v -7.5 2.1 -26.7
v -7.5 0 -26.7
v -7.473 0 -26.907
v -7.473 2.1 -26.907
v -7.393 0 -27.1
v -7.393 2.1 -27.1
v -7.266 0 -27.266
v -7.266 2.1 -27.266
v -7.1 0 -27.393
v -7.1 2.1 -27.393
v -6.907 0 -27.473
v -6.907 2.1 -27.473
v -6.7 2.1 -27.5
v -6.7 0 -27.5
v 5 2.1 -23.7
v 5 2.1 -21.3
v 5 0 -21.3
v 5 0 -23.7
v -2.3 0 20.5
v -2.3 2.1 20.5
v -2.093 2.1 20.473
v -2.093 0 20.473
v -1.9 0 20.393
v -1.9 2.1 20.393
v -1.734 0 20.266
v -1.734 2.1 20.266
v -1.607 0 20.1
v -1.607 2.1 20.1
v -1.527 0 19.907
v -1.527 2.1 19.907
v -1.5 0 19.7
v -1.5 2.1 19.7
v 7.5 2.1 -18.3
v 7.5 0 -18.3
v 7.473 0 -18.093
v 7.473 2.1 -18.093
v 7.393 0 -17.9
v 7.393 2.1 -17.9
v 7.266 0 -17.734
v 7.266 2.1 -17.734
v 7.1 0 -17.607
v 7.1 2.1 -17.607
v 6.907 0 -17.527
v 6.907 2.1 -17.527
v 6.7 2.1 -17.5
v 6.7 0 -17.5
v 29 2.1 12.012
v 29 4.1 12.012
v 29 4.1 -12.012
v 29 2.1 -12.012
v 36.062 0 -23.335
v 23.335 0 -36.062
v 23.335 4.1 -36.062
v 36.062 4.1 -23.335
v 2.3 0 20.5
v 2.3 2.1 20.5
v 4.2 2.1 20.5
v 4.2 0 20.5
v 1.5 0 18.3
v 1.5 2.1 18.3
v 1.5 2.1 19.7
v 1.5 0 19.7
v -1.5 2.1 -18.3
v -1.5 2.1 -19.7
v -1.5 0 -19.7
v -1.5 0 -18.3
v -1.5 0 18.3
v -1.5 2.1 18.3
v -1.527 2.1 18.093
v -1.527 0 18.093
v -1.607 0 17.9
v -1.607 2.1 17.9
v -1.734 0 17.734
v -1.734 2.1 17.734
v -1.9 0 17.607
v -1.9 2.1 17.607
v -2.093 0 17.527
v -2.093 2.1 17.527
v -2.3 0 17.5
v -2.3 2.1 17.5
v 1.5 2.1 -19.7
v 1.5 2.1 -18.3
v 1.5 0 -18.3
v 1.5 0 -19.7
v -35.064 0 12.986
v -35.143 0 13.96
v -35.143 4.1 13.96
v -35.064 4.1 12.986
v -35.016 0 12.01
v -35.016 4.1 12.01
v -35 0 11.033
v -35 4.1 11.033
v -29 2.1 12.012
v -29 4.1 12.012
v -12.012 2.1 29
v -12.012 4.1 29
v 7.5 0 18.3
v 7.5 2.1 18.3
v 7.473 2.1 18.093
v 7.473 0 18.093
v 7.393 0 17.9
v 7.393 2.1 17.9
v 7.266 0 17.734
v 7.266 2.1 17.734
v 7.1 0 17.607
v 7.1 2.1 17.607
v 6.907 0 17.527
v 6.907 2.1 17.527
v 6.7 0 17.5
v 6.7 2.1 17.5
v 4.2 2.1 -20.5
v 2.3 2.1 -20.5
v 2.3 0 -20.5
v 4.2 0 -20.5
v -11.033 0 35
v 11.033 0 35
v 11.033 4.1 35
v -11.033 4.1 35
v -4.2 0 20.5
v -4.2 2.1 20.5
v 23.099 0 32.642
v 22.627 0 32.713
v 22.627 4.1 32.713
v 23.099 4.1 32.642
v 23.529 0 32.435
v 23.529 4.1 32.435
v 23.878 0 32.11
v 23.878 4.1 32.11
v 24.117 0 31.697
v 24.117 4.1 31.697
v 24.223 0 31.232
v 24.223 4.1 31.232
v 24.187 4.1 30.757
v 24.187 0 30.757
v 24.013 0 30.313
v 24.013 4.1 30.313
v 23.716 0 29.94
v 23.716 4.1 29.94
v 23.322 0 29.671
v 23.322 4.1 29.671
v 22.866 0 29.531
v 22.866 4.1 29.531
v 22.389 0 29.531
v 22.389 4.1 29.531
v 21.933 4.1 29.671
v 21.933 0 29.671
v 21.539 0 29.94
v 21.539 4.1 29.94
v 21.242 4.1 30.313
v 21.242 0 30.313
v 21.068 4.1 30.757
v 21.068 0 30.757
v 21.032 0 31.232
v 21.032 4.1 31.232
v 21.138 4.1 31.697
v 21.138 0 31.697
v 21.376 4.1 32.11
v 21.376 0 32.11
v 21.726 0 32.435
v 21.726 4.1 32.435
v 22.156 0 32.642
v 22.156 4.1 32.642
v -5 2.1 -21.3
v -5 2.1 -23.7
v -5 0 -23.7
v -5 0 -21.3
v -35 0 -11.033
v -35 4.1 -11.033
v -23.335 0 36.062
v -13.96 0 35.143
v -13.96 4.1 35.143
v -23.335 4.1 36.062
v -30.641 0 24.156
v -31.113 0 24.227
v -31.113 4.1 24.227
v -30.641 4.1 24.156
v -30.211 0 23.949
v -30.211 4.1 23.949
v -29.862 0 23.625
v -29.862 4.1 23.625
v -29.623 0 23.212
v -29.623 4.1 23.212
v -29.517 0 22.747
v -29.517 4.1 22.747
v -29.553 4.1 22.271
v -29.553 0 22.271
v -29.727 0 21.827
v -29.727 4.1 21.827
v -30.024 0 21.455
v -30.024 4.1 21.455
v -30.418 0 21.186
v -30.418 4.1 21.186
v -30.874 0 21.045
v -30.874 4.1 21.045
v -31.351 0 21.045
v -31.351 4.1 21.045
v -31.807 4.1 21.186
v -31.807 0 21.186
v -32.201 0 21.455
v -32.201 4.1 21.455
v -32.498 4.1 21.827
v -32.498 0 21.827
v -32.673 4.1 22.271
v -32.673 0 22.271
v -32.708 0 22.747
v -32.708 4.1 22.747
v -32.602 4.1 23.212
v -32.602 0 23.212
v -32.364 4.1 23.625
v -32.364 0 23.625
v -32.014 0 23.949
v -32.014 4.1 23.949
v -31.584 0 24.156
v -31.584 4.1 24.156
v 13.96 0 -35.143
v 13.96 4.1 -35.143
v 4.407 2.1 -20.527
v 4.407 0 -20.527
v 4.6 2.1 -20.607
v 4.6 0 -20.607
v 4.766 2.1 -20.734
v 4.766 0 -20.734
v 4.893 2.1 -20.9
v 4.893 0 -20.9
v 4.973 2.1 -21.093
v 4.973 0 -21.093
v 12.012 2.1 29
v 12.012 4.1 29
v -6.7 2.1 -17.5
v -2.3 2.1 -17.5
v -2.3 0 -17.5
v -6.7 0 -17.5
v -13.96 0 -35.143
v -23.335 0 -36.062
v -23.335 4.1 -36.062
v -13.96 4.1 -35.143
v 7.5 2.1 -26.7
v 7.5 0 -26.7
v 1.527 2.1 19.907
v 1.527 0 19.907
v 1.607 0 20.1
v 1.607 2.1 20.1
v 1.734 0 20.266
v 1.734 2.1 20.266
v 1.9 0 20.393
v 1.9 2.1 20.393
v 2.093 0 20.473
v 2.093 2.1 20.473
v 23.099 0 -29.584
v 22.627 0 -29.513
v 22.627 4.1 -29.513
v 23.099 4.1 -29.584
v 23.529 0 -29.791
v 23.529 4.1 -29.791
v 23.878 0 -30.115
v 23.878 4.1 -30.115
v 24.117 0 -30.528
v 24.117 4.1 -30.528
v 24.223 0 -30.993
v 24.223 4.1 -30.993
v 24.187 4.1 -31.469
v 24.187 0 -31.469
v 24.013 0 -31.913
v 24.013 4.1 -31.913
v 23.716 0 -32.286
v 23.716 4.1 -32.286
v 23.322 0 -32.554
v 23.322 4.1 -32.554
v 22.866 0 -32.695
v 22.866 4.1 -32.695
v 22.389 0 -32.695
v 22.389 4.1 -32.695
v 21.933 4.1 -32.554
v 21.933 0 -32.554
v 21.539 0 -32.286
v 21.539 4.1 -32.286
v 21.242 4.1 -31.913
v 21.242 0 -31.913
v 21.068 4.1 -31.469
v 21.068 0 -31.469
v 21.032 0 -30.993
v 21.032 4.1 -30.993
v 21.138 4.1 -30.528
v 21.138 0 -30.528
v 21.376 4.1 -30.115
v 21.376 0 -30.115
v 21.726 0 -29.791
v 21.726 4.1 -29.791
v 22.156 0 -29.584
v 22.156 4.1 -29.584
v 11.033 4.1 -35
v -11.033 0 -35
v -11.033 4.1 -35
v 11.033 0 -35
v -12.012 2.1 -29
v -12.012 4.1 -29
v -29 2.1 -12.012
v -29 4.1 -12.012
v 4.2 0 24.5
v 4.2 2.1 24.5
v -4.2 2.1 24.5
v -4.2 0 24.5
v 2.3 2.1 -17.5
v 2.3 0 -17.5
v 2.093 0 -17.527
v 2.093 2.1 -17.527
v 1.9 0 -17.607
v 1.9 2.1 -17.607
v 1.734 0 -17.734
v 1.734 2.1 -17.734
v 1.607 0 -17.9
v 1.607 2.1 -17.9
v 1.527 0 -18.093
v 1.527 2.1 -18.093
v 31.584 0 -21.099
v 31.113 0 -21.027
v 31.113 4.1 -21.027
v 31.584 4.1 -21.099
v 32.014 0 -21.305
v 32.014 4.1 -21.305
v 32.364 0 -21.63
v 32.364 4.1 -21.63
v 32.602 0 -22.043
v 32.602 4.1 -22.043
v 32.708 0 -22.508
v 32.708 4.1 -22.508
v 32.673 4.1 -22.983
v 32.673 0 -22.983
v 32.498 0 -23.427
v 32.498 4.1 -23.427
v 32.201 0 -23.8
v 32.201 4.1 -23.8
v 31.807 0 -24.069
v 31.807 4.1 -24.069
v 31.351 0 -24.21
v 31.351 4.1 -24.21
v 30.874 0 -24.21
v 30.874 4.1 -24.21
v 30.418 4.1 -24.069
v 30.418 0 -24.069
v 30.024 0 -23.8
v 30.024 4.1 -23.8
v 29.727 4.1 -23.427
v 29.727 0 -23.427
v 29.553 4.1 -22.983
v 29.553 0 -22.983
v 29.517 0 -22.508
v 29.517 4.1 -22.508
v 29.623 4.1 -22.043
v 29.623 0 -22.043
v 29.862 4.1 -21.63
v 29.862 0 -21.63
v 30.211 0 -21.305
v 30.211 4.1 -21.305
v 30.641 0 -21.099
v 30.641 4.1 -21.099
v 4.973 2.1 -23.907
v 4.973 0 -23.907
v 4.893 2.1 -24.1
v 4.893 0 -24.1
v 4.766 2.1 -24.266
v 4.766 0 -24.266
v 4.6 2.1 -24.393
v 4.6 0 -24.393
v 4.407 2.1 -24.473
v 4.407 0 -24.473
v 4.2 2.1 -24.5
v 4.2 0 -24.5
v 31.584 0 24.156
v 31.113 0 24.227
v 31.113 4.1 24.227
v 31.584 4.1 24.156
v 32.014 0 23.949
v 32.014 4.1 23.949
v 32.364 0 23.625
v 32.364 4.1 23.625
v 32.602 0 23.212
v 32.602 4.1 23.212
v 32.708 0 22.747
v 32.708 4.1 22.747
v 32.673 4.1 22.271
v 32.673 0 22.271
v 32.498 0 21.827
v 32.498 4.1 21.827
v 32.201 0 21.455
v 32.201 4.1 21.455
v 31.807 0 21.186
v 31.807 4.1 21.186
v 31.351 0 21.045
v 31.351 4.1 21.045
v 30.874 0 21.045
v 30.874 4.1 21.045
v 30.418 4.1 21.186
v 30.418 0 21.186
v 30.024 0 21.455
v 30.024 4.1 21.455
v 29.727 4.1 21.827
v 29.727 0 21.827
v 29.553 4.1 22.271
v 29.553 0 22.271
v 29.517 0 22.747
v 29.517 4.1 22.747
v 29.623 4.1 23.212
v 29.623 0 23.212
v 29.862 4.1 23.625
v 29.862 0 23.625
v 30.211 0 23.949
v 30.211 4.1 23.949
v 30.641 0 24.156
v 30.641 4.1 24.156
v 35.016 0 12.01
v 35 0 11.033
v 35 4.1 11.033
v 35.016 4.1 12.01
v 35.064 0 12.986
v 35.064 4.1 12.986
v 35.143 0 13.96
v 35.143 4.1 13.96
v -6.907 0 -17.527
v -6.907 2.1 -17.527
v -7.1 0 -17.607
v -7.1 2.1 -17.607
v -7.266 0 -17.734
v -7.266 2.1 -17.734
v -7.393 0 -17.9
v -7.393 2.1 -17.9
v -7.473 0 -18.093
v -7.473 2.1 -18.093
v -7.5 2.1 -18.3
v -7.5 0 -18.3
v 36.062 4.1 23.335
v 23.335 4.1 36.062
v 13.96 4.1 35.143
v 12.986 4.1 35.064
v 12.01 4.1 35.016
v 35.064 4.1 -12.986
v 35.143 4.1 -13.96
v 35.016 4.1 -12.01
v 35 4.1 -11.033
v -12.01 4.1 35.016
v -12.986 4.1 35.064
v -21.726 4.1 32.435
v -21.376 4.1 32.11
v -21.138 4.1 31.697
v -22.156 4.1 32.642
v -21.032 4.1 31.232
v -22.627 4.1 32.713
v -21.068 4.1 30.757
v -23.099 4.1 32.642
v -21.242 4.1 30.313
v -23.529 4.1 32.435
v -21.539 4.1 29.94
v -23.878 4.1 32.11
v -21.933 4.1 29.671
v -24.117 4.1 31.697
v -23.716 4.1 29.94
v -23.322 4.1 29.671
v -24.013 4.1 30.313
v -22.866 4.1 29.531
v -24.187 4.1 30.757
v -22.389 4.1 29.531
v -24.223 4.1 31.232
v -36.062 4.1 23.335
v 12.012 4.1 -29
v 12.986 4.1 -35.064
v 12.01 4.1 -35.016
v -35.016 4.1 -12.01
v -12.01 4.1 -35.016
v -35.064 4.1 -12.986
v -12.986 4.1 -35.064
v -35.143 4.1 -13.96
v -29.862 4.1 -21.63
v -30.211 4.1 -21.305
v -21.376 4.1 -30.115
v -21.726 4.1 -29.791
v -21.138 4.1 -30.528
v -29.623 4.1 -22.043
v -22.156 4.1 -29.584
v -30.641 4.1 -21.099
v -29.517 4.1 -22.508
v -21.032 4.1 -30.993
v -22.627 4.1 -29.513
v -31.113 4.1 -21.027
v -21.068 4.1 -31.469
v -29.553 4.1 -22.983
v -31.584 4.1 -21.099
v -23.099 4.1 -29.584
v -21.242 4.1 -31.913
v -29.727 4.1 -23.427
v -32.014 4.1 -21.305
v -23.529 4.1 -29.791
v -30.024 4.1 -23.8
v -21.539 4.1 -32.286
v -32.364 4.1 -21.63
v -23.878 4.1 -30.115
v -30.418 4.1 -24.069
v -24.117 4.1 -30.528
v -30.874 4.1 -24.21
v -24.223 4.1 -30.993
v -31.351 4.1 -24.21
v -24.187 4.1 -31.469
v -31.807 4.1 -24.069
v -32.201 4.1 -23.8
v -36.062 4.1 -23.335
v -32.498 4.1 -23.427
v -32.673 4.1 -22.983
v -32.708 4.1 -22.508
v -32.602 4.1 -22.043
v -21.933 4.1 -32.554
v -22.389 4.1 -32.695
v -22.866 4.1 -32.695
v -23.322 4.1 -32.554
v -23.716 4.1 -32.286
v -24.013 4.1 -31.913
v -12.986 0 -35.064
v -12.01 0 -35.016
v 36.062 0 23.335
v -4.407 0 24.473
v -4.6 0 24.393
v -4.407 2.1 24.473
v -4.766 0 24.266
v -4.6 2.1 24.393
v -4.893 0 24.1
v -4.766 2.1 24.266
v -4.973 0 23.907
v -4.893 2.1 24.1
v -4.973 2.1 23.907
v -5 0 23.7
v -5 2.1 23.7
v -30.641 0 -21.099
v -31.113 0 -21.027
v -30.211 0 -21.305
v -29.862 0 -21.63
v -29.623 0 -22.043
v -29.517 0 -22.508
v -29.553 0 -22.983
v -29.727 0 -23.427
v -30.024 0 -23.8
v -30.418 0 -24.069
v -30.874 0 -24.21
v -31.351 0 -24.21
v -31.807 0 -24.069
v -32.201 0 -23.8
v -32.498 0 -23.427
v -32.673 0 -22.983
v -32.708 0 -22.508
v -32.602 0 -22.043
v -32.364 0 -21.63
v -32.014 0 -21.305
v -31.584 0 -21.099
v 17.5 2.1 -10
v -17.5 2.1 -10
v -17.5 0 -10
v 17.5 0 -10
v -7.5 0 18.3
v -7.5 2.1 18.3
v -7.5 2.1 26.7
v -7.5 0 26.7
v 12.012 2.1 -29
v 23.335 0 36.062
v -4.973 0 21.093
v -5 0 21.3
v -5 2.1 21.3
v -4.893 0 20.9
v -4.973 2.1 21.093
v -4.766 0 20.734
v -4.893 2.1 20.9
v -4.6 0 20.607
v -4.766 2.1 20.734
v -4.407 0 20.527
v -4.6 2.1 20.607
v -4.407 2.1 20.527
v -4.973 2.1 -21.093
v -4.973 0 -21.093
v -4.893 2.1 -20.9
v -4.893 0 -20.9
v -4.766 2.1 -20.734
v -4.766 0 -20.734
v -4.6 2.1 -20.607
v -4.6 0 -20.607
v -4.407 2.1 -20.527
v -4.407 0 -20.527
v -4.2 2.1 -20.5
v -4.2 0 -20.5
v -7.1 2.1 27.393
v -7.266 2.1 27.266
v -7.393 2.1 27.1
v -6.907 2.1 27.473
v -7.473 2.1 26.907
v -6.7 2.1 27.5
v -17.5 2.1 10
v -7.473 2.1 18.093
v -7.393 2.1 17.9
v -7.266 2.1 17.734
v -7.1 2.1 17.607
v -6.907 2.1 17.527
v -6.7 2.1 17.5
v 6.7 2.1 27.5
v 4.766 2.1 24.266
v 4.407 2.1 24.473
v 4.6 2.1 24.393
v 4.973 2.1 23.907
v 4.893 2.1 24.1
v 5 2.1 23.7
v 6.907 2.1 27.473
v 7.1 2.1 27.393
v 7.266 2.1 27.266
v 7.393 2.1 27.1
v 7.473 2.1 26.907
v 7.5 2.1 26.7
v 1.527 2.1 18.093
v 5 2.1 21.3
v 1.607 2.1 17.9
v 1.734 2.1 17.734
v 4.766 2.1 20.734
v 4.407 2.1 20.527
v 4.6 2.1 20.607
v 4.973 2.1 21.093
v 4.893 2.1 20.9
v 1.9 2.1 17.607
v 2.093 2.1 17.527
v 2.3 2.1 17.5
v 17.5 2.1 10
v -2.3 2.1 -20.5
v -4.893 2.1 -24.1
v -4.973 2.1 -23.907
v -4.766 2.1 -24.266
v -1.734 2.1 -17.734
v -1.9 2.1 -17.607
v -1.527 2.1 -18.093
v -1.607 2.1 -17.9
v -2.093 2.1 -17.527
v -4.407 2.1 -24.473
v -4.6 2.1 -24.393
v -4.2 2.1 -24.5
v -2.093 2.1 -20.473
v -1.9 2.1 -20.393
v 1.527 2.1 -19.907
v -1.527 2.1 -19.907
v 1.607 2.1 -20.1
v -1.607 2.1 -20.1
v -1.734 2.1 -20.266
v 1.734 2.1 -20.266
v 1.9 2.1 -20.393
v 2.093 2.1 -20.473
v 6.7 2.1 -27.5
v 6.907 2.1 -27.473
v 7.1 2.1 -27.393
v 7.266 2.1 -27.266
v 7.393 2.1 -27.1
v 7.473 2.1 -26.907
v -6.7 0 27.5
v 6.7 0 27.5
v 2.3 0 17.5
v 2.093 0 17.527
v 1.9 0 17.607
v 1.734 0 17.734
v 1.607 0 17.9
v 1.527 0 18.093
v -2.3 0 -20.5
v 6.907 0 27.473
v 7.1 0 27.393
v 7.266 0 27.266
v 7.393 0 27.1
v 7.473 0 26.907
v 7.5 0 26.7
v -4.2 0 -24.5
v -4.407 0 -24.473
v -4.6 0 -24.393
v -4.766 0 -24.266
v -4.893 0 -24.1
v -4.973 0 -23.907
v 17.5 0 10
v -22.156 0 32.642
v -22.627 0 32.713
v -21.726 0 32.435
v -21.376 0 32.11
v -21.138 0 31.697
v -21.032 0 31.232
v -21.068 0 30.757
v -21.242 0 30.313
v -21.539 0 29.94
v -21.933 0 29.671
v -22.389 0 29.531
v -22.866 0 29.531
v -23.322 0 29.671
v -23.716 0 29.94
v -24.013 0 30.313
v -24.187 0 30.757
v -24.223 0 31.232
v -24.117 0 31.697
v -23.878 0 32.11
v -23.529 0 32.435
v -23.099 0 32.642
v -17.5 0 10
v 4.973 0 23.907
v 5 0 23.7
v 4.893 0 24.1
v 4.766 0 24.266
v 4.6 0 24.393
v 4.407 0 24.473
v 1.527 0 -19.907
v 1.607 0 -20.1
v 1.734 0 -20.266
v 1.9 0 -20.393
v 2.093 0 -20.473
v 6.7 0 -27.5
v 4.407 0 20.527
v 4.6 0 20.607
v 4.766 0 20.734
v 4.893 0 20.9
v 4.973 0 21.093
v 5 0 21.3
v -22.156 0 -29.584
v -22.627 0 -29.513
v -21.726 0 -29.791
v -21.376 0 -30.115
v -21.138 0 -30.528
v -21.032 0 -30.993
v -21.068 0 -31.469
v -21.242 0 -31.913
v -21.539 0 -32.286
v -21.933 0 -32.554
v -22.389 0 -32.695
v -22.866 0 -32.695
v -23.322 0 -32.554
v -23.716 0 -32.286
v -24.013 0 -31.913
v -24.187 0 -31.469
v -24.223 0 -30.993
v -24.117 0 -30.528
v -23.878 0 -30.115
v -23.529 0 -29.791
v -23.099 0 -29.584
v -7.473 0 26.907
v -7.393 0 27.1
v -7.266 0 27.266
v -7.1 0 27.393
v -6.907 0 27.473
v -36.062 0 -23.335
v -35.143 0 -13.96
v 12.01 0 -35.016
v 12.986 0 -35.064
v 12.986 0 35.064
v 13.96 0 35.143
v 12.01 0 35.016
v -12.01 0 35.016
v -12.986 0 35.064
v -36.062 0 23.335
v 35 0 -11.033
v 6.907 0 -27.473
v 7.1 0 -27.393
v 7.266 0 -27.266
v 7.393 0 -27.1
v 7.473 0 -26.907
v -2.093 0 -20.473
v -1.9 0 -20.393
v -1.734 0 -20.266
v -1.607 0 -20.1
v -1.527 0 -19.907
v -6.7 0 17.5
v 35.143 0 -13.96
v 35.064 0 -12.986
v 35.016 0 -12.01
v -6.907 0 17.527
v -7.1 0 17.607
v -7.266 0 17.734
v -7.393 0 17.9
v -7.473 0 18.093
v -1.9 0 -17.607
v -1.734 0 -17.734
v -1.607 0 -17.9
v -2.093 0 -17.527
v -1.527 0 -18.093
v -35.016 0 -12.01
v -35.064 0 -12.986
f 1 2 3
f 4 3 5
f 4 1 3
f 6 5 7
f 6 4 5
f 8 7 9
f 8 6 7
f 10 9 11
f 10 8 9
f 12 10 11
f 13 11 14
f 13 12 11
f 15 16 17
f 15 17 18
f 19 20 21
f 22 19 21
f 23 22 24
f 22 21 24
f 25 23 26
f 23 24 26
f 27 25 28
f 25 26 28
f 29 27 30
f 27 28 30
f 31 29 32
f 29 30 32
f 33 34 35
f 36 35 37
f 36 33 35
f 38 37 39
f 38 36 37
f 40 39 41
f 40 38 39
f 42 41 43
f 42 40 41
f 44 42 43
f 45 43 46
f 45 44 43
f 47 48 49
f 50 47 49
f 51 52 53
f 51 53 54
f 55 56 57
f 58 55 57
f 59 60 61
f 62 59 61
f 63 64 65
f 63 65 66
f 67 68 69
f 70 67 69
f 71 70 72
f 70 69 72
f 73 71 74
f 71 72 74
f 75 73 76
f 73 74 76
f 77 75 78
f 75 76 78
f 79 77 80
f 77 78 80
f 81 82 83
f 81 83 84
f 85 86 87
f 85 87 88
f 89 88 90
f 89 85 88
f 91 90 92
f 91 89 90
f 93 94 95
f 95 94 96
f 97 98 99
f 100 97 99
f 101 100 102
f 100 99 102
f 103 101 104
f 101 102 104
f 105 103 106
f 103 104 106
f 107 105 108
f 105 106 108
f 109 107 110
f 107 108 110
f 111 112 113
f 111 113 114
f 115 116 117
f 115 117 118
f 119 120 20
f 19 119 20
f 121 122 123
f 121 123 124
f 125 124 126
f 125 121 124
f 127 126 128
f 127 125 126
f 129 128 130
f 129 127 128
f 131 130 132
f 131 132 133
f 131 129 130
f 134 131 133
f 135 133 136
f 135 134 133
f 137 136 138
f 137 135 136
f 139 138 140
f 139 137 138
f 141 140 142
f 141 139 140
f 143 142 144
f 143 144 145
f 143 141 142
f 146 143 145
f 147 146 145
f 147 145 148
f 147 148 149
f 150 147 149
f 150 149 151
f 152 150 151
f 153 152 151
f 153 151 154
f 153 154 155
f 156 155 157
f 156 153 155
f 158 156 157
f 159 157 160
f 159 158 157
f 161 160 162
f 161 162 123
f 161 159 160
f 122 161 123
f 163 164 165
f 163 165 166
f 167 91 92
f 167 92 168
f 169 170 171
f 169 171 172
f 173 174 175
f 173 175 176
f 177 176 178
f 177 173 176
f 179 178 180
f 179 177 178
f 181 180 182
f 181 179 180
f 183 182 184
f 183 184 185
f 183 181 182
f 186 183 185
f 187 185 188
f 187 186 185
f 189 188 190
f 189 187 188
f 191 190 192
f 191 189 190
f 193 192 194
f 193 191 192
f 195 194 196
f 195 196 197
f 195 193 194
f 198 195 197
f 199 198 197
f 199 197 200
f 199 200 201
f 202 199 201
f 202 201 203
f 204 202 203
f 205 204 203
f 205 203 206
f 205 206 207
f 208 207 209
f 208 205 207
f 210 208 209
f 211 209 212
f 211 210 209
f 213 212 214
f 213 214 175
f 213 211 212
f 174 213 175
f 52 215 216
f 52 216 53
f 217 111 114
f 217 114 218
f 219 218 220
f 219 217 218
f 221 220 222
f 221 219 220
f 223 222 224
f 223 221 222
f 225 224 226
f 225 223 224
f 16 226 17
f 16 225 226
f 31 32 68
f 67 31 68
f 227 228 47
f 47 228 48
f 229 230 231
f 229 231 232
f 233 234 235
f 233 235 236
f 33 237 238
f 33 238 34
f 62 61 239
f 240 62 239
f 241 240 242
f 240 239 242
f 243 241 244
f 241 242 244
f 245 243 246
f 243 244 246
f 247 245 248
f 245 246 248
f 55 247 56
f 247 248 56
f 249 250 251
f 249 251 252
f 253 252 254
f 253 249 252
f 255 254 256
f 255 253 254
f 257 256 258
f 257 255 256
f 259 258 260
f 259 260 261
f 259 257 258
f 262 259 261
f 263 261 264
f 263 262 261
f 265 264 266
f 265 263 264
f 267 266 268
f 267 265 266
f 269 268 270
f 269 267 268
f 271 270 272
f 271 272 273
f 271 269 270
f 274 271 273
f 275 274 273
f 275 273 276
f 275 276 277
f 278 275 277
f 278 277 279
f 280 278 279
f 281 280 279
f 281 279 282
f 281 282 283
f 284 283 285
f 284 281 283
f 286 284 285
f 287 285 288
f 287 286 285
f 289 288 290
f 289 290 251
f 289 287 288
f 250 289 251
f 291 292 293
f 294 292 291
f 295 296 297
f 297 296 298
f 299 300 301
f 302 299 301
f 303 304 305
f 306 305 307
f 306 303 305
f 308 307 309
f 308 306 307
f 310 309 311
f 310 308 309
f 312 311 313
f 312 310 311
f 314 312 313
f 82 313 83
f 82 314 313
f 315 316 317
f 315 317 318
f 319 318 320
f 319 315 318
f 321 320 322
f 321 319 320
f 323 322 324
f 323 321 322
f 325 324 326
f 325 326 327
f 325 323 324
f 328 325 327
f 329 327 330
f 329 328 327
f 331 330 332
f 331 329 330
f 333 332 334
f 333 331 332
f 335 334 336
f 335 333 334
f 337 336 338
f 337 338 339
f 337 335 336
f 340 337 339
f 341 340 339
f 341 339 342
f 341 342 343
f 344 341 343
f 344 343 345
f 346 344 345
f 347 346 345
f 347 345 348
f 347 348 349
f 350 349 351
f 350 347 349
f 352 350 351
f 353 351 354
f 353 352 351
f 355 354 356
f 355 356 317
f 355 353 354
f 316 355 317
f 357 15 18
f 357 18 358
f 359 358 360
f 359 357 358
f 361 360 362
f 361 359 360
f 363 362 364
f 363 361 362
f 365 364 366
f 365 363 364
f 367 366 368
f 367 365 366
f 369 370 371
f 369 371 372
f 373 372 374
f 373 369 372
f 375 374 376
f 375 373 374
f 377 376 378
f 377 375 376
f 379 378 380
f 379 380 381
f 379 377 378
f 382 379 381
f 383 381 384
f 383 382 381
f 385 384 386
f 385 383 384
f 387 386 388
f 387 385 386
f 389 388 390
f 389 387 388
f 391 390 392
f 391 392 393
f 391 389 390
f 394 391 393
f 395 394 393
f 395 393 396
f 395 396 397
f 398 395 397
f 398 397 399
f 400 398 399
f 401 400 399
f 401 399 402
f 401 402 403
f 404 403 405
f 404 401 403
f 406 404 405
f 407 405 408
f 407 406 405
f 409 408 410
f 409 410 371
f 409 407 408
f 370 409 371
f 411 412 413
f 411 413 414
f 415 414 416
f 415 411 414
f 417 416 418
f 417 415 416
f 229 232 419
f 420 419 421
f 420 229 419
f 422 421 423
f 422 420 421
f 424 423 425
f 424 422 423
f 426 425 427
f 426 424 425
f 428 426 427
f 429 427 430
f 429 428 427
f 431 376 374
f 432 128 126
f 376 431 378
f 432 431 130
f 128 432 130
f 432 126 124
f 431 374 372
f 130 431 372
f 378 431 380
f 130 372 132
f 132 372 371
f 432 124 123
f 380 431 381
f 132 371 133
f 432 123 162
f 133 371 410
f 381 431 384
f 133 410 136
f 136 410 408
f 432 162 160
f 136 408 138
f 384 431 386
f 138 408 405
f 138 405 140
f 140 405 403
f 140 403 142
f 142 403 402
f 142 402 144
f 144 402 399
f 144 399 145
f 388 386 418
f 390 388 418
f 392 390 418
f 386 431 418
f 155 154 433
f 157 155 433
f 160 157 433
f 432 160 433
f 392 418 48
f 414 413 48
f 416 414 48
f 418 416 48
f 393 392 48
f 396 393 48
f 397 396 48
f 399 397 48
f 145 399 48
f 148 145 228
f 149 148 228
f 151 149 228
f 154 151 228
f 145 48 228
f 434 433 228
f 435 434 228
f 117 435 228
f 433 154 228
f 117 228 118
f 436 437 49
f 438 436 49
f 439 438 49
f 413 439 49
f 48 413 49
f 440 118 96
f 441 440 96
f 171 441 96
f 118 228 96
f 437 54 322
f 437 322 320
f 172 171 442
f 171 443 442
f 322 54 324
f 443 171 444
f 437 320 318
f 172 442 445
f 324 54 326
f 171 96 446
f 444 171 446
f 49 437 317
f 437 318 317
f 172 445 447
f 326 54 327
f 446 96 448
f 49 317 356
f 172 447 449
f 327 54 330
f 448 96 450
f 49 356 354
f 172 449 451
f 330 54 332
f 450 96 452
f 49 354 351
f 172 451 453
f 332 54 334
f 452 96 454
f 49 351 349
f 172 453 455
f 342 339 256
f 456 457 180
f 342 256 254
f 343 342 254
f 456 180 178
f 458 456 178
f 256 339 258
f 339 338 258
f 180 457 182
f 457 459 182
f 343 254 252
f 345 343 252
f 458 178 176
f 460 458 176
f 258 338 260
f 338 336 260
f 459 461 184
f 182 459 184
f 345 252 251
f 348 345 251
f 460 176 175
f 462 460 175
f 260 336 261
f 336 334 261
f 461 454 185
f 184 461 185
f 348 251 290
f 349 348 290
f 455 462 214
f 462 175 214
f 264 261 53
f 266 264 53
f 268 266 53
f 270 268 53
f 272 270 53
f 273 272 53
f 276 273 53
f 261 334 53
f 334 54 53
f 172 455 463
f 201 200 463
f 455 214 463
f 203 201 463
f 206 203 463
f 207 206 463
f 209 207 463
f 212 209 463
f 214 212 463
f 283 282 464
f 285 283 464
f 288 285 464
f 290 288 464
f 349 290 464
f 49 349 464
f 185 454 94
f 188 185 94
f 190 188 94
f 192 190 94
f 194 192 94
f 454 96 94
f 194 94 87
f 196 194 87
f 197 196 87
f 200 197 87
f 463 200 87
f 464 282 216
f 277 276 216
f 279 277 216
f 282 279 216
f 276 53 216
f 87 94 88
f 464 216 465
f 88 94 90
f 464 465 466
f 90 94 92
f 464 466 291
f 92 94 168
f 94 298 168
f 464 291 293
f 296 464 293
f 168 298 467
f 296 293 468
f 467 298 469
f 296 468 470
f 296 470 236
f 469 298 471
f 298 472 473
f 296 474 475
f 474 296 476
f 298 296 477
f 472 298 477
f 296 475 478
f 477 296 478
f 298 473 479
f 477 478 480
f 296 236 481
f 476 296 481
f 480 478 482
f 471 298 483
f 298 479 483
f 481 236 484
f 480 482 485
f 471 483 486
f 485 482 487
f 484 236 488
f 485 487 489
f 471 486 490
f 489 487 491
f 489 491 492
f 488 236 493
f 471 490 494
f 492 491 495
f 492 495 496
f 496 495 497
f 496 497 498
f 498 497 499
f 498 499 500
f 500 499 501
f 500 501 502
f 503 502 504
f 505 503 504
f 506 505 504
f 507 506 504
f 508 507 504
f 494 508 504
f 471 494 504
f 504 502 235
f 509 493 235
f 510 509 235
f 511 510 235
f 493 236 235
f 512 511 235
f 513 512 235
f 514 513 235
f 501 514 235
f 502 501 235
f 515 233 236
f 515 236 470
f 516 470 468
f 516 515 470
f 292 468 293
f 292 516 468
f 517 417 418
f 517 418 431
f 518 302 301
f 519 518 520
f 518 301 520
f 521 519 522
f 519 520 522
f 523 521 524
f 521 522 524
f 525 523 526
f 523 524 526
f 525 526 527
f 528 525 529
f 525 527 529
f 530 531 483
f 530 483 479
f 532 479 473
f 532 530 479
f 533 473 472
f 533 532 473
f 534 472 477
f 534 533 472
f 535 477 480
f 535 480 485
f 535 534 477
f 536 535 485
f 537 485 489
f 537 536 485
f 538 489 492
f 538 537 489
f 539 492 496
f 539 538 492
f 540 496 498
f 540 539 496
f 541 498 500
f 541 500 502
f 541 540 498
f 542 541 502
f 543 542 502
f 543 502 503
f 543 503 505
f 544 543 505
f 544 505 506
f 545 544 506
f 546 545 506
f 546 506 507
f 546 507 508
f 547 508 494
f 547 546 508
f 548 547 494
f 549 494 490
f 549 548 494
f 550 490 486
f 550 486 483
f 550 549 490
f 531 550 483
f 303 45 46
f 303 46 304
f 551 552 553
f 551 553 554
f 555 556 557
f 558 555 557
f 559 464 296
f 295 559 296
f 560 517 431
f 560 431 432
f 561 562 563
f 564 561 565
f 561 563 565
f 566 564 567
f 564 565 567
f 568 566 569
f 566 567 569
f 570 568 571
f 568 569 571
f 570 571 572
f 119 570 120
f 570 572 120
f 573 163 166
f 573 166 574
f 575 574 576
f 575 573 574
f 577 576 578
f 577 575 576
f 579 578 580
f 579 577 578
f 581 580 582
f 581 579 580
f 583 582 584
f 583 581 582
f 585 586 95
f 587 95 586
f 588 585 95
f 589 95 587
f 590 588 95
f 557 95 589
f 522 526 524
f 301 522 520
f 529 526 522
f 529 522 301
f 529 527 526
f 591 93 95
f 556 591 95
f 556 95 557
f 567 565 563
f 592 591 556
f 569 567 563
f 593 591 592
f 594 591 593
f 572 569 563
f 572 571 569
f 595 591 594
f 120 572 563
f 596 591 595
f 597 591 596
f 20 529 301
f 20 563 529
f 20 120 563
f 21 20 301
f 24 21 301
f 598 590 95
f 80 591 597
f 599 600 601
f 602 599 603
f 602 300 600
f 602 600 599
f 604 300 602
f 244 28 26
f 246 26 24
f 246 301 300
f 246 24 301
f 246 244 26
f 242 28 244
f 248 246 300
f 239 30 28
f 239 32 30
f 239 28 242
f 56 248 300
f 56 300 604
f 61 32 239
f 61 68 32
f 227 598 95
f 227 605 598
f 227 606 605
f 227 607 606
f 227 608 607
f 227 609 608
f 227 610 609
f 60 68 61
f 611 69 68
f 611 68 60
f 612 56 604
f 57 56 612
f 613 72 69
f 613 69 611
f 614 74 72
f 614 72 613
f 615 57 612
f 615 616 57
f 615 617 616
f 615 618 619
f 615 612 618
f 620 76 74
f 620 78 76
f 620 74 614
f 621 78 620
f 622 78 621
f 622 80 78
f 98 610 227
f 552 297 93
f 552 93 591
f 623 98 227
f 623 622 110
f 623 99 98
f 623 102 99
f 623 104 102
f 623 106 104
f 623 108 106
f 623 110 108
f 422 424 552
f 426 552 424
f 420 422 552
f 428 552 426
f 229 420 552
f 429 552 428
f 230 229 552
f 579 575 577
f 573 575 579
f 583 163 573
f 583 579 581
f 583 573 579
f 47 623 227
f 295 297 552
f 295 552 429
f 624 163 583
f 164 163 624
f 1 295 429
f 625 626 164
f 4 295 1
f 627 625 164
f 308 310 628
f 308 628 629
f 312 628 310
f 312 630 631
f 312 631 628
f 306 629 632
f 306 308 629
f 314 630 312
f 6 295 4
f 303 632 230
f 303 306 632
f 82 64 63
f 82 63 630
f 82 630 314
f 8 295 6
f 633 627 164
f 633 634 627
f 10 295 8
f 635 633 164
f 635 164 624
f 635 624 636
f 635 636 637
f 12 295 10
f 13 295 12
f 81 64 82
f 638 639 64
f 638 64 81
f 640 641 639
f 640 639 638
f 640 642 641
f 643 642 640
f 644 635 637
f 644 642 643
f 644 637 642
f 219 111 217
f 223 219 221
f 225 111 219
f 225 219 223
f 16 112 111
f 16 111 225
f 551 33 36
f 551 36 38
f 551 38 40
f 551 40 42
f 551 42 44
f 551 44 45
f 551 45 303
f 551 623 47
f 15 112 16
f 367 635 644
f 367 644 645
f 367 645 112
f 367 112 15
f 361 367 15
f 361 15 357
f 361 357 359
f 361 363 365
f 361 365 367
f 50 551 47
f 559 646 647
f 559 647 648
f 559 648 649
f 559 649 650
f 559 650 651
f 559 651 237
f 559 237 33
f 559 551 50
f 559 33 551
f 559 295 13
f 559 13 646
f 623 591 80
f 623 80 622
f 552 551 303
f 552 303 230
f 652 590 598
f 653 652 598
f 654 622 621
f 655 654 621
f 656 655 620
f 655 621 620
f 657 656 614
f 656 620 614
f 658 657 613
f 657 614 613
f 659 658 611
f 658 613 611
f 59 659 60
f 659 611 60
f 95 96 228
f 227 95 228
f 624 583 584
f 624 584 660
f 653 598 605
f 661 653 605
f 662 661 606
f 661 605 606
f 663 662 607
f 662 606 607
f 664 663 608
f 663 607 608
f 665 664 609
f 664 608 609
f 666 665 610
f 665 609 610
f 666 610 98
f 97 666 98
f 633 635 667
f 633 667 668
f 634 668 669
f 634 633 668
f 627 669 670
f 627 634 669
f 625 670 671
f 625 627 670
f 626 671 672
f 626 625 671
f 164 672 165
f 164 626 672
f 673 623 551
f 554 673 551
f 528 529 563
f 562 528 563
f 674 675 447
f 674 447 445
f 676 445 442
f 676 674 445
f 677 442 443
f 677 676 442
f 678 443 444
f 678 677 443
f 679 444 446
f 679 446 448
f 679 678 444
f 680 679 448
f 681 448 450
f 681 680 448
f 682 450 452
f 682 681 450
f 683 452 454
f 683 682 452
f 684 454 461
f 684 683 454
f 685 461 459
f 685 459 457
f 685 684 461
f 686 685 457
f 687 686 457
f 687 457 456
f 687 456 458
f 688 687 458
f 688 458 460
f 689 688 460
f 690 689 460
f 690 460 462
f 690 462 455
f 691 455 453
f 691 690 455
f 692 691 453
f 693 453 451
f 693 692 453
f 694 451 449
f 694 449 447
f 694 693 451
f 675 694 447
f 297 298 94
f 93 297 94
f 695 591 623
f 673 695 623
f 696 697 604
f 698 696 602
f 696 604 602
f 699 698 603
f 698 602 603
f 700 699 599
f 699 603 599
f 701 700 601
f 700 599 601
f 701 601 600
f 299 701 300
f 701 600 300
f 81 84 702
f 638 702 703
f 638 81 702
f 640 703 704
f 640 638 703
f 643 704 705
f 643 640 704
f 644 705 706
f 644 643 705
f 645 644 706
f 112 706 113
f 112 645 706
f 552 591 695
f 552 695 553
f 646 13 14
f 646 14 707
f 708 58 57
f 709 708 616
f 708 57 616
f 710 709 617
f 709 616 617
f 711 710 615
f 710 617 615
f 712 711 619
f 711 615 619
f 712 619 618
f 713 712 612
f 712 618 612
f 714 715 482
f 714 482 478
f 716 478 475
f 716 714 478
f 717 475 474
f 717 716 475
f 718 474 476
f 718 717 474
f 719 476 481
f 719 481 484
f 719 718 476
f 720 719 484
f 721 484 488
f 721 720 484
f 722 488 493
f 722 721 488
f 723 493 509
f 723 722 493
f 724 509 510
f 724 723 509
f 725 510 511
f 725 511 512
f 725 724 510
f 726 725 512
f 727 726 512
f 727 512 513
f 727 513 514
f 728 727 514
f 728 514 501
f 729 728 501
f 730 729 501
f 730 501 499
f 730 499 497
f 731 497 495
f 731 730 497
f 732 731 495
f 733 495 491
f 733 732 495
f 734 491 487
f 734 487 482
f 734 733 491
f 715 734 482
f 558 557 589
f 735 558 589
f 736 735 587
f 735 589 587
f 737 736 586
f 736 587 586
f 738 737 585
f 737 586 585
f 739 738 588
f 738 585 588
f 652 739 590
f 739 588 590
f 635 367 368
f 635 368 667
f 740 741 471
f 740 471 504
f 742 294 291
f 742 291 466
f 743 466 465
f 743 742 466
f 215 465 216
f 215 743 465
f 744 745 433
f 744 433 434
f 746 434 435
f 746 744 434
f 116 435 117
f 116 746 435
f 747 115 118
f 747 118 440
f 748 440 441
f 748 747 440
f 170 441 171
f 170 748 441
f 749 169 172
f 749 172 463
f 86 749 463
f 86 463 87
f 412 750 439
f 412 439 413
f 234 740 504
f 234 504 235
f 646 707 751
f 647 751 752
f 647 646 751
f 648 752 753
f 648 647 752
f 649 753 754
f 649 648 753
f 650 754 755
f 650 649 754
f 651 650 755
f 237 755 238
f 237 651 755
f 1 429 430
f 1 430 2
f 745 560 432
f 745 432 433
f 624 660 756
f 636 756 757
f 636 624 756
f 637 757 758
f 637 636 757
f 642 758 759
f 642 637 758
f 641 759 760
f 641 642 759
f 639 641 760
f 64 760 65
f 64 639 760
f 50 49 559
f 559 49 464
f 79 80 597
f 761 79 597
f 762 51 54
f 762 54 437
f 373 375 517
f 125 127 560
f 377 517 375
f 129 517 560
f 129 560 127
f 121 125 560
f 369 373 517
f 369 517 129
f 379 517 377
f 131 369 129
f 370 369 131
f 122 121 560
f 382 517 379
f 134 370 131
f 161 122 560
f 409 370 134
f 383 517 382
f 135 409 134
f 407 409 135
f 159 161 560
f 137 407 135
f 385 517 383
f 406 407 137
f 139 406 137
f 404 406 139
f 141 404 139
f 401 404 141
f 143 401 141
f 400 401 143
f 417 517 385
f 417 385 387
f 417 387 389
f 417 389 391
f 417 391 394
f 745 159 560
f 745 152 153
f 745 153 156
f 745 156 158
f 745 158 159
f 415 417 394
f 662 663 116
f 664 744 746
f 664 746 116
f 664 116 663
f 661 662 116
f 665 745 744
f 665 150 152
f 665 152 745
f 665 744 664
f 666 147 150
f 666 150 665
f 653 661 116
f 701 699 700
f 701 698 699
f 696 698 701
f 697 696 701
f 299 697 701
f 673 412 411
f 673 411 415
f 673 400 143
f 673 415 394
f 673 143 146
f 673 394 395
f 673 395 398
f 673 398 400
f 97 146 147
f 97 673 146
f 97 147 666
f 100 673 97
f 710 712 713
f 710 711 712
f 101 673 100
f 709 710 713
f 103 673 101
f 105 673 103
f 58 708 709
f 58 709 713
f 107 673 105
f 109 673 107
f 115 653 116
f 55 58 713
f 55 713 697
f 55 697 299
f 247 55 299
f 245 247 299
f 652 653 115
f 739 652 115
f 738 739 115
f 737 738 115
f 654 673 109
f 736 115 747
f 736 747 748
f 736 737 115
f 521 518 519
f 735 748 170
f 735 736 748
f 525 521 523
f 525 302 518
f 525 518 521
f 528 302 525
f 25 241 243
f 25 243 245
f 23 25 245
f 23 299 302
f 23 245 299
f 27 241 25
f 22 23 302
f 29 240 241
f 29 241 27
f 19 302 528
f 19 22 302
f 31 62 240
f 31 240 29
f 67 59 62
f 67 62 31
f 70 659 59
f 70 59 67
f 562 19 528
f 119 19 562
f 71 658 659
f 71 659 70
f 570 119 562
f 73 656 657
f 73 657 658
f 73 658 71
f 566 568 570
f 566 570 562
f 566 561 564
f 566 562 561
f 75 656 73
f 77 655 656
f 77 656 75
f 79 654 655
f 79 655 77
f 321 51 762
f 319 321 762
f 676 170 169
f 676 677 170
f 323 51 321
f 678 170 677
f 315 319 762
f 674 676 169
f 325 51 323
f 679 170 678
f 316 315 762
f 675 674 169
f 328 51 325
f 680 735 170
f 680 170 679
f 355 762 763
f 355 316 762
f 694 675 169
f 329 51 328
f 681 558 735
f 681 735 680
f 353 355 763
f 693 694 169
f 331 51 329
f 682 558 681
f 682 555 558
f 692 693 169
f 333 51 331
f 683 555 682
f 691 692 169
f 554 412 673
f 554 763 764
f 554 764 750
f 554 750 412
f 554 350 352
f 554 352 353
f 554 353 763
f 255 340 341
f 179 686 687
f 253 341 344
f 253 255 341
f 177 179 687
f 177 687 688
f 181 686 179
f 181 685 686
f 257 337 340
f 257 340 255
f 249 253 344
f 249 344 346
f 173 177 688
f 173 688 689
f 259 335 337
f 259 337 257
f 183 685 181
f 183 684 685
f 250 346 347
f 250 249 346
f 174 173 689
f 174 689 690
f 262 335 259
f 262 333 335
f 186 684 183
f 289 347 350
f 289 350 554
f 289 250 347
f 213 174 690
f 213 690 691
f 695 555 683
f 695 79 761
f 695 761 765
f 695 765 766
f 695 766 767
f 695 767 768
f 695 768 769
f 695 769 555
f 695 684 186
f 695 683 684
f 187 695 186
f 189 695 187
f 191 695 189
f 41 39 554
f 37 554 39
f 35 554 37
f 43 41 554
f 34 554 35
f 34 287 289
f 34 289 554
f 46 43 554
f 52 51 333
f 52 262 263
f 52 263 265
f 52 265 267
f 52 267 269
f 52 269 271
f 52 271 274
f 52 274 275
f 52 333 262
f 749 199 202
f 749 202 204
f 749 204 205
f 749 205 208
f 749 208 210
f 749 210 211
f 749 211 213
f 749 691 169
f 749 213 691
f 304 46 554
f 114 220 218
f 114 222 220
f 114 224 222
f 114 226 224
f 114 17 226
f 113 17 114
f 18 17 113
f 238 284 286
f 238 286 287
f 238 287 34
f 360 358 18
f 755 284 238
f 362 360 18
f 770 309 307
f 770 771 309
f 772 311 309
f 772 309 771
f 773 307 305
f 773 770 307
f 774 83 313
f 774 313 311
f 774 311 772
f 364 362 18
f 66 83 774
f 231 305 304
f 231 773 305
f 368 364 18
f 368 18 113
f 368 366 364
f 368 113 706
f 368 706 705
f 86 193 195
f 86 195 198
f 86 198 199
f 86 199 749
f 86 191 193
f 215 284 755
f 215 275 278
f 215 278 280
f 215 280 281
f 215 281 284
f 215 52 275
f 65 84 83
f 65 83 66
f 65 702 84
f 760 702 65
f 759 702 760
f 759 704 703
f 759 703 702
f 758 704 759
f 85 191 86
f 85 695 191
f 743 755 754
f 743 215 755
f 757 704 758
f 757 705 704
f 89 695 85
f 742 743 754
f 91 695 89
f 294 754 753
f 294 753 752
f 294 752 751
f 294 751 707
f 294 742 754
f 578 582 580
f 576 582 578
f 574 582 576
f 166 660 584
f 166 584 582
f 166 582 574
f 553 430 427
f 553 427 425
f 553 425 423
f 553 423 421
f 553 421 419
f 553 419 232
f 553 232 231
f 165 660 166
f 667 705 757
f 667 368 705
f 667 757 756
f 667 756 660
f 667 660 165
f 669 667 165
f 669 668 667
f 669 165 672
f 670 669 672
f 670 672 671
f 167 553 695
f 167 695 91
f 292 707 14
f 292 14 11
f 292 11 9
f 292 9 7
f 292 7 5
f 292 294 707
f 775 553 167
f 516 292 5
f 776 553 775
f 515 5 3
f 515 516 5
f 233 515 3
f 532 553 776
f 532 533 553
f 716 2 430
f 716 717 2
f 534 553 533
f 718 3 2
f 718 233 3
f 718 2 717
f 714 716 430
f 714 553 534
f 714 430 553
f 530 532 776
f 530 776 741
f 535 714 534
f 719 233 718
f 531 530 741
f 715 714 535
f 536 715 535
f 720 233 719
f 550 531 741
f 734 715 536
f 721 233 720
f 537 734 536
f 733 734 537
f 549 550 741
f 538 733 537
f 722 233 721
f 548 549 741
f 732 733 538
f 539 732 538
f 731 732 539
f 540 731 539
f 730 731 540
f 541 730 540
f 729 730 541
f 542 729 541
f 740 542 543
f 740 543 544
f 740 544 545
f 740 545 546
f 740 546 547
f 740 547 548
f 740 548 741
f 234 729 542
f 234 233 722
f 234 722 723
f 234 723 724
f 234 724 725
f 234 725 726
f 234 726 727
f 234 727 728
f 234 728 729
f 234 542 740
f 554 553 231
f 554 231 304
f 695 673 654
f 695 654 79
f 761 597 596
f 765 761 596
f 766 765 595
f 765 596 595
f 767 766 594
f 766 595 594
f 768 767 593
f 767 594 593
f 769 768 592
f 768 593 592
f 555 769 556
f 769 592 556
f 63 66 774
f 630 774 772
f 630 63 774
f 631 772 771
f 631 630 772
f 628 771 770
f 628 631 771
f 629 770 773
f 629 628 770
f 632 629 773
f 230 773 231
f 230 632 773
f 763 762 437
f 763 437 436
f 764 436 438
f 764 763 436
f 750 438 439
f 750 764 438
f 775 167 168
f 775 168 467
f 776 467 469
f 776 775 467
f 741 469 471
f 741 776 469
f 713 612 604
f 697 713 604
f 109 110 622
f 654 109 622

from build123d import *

# Parameters (mm, degrees)
SKETCH2_R           = 1.6
BOSS_EXTRUDE1_DEPTH = 4.1
CUT_EXTRUDE1_DEPTH  = 2
FILLET4_R           = 30
CUT_EXTRUDE4_DEPTH  = 52.043216983
SKETCH9_W           = 35
SKETCH9_H           = 20
CUT_EXTRUDE5_DEPTH  = 52.043216983


with BuildPart() as part:
    # Sketch2 → Boss-Extrude1 (new body)
    with BuildSketch(Plane(origin=(0, 0, 0), x_dir=(1, 0, 0), z_dir=(0, 1, 0))):
        Polygon((-12.5, 35), (12.5, 35), (23.334523779, 36.062445841), (36.062445841, 23.334523779), (35, 12.5), (35, -12.5), (36.062445841, -23.334523779), (23.334523779, -36.062445841), (12.5, -35), (-12.5, -35), (-23.334523779, -36.062445841), (-36.062445841, -23.334523779), (-35, -12.5), (-35, 12.5), (-36.062445841, 23.334523779), (-23.334523779, 36.062445841), align=None)
        with Locations(Location((22.627416998, 31.112698372, 0), (0, 0, 270))):
            Circle(SKETCH2_R, mode=Mode.SUBTRACT)
        with Locations(Location((31.112698372, 22.627416998, 0), (0, 0, 270))):
            Circle(SKETCH2_R, mode=Mode.SUBTRACT)
        with Locations(Location((22.627416998, -31.112698372, 0), (0, 0, 270))):
            Circle(SKETCH2_R, mode=Mode.SUBTRACT)
        with Locations(Location((31.112698372, -22.627416998, 0), (0, 0, 270))):
            Circle(SKETCH2_R, mode=Mode.SUBTRACT)
        with Locations(Location((-31.112698372, -22.627416998, 0), (0, 0, 270))):
            Circle(SKETCH2_R, mode=Mode.SUBTRACT)
        with Locations(Location((-22.627416998, -31.112698372, 0), (0, 0, 270))):
            Circle(SKETCH2_R, mode=Mode.SUBTRACT)
        with Locations(Location((-22.627416998, 31.112698372, 0), (0, 0, 270))):
            Circle(SKETCH2_R, mode=Mode.SUBTRACT)
        with Locations(Location((-31.112698372, 22.627416998, 0), (0, 0, 270))):
            Circle(SKETCH2_R, mode=Mode.SUBTRACT)
    extrude(amount=BOSS_EXTRUDE1_DEPTH)

    # Sketch4 → Cut-Extrude1 (cut)
    with BuildSketch(Plane(origin=(0, 4.1, 0), x_dir=(1, 0, 0), z_dir=(0, 1, 0))):
        Polygon((29, 12.012193309), (12.012193309, 29), (-12.012193309, 29), (-29, 12.012193309), (-29, -12.012193309), (-12.012193309, -29), (12.012193309, -29), (29, -12.012193309), align=None)
    extrude(amount=-CUT_EXTRUDE1_DEPTH, mode=Mode.SUBTRACT)

    # Fillet4
    # the kernel refuses this fillet: 30 mm, written as the material it adds along each edge
    with BuildSketch(Plane(origin=(35, 0, -12.5), x_dir=(0.09759304388629828, 0, -0.9952264052892723), z_dir=(0, 1, 0)), Plane(origin=(35, 0, 12.5), x_dir=(0, 0, -1), z_dir=(0, 1, 0)), Plane(origin=(12.5, 0, 35), x_dir=(0.9952264052892723, 0, 0.09759304388629875), z_dir=(0, 1, 0)), Plane(origin=(-12.5, 0, 35), x_dir=(1, 0, 0), z_dir=(0, 1, 0)), Plane(origin=(-35, 0, 12.5), x_dir=(-0.09759304388630283, 0, 0.9952264052892719), z_dir=(0, 1, 0)), Plane(origin=(-35, 0, -12.5), x_dir=(0, 0, 1), z_dir=(0, 1, 0)), Plane(origin=(12.5, 0, -35), x_dir=(-1, 0, 0), z_dir=(0, 1, 0))) as fillet4_piece_1:
        with BuildLine():
            CenterArc((FILLET4_R * 0.0489132680019, -FILLET4_R), FILLET4_R, 90, 5.600584003)
            Line((-FILLET4_R * 0.0486797758844, -FILLET4_R * 0.00477359471073), (0, 0))
            Line((0, 0), (FILLET4_R * 0.0489132680019, 0))
        make_face()
    extrude(amount=4.1)
    with BuildSketch(Plane(origin=(-12.5, 0, -35), x_dir=(1, 0, 0), z_dir=(0, 1, 0))) as fillet4_piece_2:
        with BuildLine():
            CenterArc((FILLET4_R * 0.0489132680019, FILLET4_R), FILLET4_R, 264.399415997, 5.600584003)
            Line((-FILLET4_R * 0.0486797758844, FILLET4_R * 0.00477359471073), (0, 0))
            Line((0, 0), (FILLET4_R * 0.0489132680019, 0))
        make_face()
    extrude(amount=4.1)

    # Sketch8 → Cut-Extrude4 (cut, through all)
    with BuildSketch(Plane(origin=(0, 2.1, 0), x_dir=(1, 0, 0), z_dir=(0, 1, 0))):
        with BuildLine():
            Line((-1.5, 19.7), (-1.5, 18.3))
            ThreePointArc((-1.5, 18.3), (-1.734314575, 17.734314575), (-2.3, 17.5))
            Line((-2.3, 17.5), (-6.7, 17.5))
            ThreePointArc((-6.7, 17.5), (-7.265685425, 17.734314575), (-7.5, 18.3))
            Line((-7.5, 18.3), (-7.5, 26.7))
            ThreePointArc((-7.5, 26.7), (-7.265685425, 27.265685425), (-6.7, 27.5))
            Line((-6.7, 27.5), (6.7, 27.5))
            ThreePointArc((6.7, 27.5), (7.265685425, 27.265685425), (7.5, 26.7))
            Line((7.5, 26.7), (7.5, 18.3))
            ThreePointArc((7.5, 18.3), (7.265685425, 17.734314575), (6.7, 17.5))
            Line((6.7, 17.5), (2.3, 17.5))
            ThreePointArc((2.3, 17.5), (1.734314575, 17.734314575), (1.5, 18.3))
            Line((1.5, 18.3), (1.5, 19.7))
            ThreePointArc((1.5, 19.7), (1.734314575, 20.265685425), (2.3, 20.5))
            Line((2.3, 20.5), (4.2, 20.5))
            ThreePointArc((4.2, 20.5), (4.765685425, 20.734314575), (5, 21.3))
            Line((5, 21.3), (5, 23.7))
            ThreePointArc((5, 23.7), (4.765685425, 24.265685425), (4.2, 24.5))
            Line((4.2, 24.5), (-4.2, 24.5))
            ThreePointArc((-4.2, 24.5), (-4.765685425, 24.265685425), (-5, 23.7))
            Line((-5, 23.7), (-5, 21.3))
            ThreePointArc((-5, 21.3), (-4.765685425, 20.734314575), (-4.2, 20.5))
            Line((-4.2, 20.5), (-2.3, 20.5))
            ThreePointArc((-2.3, 20.5), (-1.734314575, 20.265685425), (-1.5, 19.7))
        make_face()
        with BuildLine():
            Line((-7.5, -18.3), (-7.5, -26.7))
            ThreePointArc((-7.5, -26.7), (-7.265685425, -27.265685425), (-6.7, -27.5))
            Line((-6.7, -27.5), (6.7, -27.5))
            ThreePointArc((6.7, -27.5), (7.265685425, -27.265685425), (7.5, -26.7))
            Line((7.5, -26.7), (7.5, -18.3))
            ThreePointArc((7.5, -18.3), (7.265685425, -17.734314575), (6.7, -17.5))
            Line((6.7, -17.5), (2.3, -17.5))
            ThreePointArc((2.3, -17.5), (1.734314575, -17.734314575), (1.5, -18.3))
            Line((1.5, -18.3), (1.5, -19.7))
            ThreePointArc((1.5, -19.7), (1.734314575, -20.265685425), (2.3, -20.5))
            Line((2.3, -20.5), (4.2, -20.5))
            ThreePointArc((4.2, -20.5), (4.765685425, -20.734314575), (5, -21.3))
            Line((5, -21.3), (5, -23.7))
            ThreePointArc((5, -23.7), (4.765685425, -24.265685425), (4.2, -24.5))
            Line((4.2, -24.5), (-4.2, -24.5))
            ThreePointArc((-4.2, -24.5), (-4.765685425, -24.265685425), (-5, -23.7))
            Line((-5, -23.7), (-5, -21.3))
            ThreePointArc((-5, -21.3), (-4.765685425, -20.734314575), (-4.2, -20.5))
            Line((-4.2, -20.5), (-2.3, -20.5))
            ThreePointArc((-2.3, -20.5), (-1.734314575, -20.265685425), (-1.5, -19.7))
            Line((-1.5, -19.7), (-1.5, -18.3))
            ThreePointArc((-1.5, -18.3), (-1.734314575, -17.734314575), (-2.3, -17.5))
            Line((-2.3, -17.5), (-6.7, -17.5))
            ThreePointArc((-6.7, -17.5), (-7.265685425, -17.734314575), (-7.5, -18.3))
        make_face()
    extrude(amount=-CUT_EXTRUDE4_DEPTH, mode=Mode.SUBTRACT)

    # Sketch9 → Cut-Extrude5 (cut, through all)
    with BuildSketch(Plane(origin=(0, 2.1, 0), x_dir=(1, 0, 0), z_dir=(0, 1, 0))):
        Rectangle(SKETCH9_W, SKETCH9_H)
    extrude(amount=-CUT_EXTRUDE5_DEPTH, mode=Mode.SUBTRACT)


solid = part.part
